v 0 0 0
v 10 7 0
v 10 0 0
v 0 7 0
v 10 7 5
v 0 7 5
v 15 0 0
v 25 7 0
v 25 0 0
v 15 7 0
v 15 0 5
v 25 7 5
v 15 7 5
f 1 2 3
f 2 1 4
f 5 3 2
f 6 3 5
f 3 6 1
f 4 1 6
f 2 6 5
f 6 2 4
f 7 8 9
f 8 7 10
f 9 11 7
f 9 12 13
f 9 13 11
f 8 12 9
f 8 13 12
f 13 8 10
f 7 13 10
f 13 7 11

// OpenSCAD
// See diagrams:
// https://en.wikibooks.org/wiki/OpenSCAD_User_Manual/Primitive_Solids#polyhedron

// One quad (front) has two duplicate vertices
polyhedron([
  [  0,  0,  0 ],  //0
  [ 10,  0,  0 ],  //1
  [ 10,  7,  0 ],  //2
  [  0,  7,  0 ],  //3
  [  0,  0,  0 ],  //4
  [ 10,  0,  0 ],  //5
  [ 10,  7,  5 ],  //6
  [  0,  7,  5 ]
], [
  [0,1,2,3],  // bottom
  [4,5,1,0],  // front
  [7,6,5,4],  // top
  [5,6,2,1],  // right
  [6,7,3,2],  // back
  [7,4,0,3]
]);

// Two quads (front, right) have duplicate vertices
translate([15, 0, 0])
  polyhedron([
    [  0,  0,  0 ],  //0
    [ 10,  0,  0 ],  //1
    [ 10,  7,  0 ],  //2
    [  0,  7,  0 ],  //3
    [  0,  0,  5 ],  //4
    [ 10,  0,  0 ],  //5
    [ 10,  7,  5 ],  //6
    [  0,  7,  5 ]
  ], [
    [0,1,2,3],  // bottom
    [4,5,1,0],  // front
    [7,6,5,4],  // top
    [5,6,2,1],  // right
    [6,7,3,2],  // back
    [7,4,0,3]
  ]);
